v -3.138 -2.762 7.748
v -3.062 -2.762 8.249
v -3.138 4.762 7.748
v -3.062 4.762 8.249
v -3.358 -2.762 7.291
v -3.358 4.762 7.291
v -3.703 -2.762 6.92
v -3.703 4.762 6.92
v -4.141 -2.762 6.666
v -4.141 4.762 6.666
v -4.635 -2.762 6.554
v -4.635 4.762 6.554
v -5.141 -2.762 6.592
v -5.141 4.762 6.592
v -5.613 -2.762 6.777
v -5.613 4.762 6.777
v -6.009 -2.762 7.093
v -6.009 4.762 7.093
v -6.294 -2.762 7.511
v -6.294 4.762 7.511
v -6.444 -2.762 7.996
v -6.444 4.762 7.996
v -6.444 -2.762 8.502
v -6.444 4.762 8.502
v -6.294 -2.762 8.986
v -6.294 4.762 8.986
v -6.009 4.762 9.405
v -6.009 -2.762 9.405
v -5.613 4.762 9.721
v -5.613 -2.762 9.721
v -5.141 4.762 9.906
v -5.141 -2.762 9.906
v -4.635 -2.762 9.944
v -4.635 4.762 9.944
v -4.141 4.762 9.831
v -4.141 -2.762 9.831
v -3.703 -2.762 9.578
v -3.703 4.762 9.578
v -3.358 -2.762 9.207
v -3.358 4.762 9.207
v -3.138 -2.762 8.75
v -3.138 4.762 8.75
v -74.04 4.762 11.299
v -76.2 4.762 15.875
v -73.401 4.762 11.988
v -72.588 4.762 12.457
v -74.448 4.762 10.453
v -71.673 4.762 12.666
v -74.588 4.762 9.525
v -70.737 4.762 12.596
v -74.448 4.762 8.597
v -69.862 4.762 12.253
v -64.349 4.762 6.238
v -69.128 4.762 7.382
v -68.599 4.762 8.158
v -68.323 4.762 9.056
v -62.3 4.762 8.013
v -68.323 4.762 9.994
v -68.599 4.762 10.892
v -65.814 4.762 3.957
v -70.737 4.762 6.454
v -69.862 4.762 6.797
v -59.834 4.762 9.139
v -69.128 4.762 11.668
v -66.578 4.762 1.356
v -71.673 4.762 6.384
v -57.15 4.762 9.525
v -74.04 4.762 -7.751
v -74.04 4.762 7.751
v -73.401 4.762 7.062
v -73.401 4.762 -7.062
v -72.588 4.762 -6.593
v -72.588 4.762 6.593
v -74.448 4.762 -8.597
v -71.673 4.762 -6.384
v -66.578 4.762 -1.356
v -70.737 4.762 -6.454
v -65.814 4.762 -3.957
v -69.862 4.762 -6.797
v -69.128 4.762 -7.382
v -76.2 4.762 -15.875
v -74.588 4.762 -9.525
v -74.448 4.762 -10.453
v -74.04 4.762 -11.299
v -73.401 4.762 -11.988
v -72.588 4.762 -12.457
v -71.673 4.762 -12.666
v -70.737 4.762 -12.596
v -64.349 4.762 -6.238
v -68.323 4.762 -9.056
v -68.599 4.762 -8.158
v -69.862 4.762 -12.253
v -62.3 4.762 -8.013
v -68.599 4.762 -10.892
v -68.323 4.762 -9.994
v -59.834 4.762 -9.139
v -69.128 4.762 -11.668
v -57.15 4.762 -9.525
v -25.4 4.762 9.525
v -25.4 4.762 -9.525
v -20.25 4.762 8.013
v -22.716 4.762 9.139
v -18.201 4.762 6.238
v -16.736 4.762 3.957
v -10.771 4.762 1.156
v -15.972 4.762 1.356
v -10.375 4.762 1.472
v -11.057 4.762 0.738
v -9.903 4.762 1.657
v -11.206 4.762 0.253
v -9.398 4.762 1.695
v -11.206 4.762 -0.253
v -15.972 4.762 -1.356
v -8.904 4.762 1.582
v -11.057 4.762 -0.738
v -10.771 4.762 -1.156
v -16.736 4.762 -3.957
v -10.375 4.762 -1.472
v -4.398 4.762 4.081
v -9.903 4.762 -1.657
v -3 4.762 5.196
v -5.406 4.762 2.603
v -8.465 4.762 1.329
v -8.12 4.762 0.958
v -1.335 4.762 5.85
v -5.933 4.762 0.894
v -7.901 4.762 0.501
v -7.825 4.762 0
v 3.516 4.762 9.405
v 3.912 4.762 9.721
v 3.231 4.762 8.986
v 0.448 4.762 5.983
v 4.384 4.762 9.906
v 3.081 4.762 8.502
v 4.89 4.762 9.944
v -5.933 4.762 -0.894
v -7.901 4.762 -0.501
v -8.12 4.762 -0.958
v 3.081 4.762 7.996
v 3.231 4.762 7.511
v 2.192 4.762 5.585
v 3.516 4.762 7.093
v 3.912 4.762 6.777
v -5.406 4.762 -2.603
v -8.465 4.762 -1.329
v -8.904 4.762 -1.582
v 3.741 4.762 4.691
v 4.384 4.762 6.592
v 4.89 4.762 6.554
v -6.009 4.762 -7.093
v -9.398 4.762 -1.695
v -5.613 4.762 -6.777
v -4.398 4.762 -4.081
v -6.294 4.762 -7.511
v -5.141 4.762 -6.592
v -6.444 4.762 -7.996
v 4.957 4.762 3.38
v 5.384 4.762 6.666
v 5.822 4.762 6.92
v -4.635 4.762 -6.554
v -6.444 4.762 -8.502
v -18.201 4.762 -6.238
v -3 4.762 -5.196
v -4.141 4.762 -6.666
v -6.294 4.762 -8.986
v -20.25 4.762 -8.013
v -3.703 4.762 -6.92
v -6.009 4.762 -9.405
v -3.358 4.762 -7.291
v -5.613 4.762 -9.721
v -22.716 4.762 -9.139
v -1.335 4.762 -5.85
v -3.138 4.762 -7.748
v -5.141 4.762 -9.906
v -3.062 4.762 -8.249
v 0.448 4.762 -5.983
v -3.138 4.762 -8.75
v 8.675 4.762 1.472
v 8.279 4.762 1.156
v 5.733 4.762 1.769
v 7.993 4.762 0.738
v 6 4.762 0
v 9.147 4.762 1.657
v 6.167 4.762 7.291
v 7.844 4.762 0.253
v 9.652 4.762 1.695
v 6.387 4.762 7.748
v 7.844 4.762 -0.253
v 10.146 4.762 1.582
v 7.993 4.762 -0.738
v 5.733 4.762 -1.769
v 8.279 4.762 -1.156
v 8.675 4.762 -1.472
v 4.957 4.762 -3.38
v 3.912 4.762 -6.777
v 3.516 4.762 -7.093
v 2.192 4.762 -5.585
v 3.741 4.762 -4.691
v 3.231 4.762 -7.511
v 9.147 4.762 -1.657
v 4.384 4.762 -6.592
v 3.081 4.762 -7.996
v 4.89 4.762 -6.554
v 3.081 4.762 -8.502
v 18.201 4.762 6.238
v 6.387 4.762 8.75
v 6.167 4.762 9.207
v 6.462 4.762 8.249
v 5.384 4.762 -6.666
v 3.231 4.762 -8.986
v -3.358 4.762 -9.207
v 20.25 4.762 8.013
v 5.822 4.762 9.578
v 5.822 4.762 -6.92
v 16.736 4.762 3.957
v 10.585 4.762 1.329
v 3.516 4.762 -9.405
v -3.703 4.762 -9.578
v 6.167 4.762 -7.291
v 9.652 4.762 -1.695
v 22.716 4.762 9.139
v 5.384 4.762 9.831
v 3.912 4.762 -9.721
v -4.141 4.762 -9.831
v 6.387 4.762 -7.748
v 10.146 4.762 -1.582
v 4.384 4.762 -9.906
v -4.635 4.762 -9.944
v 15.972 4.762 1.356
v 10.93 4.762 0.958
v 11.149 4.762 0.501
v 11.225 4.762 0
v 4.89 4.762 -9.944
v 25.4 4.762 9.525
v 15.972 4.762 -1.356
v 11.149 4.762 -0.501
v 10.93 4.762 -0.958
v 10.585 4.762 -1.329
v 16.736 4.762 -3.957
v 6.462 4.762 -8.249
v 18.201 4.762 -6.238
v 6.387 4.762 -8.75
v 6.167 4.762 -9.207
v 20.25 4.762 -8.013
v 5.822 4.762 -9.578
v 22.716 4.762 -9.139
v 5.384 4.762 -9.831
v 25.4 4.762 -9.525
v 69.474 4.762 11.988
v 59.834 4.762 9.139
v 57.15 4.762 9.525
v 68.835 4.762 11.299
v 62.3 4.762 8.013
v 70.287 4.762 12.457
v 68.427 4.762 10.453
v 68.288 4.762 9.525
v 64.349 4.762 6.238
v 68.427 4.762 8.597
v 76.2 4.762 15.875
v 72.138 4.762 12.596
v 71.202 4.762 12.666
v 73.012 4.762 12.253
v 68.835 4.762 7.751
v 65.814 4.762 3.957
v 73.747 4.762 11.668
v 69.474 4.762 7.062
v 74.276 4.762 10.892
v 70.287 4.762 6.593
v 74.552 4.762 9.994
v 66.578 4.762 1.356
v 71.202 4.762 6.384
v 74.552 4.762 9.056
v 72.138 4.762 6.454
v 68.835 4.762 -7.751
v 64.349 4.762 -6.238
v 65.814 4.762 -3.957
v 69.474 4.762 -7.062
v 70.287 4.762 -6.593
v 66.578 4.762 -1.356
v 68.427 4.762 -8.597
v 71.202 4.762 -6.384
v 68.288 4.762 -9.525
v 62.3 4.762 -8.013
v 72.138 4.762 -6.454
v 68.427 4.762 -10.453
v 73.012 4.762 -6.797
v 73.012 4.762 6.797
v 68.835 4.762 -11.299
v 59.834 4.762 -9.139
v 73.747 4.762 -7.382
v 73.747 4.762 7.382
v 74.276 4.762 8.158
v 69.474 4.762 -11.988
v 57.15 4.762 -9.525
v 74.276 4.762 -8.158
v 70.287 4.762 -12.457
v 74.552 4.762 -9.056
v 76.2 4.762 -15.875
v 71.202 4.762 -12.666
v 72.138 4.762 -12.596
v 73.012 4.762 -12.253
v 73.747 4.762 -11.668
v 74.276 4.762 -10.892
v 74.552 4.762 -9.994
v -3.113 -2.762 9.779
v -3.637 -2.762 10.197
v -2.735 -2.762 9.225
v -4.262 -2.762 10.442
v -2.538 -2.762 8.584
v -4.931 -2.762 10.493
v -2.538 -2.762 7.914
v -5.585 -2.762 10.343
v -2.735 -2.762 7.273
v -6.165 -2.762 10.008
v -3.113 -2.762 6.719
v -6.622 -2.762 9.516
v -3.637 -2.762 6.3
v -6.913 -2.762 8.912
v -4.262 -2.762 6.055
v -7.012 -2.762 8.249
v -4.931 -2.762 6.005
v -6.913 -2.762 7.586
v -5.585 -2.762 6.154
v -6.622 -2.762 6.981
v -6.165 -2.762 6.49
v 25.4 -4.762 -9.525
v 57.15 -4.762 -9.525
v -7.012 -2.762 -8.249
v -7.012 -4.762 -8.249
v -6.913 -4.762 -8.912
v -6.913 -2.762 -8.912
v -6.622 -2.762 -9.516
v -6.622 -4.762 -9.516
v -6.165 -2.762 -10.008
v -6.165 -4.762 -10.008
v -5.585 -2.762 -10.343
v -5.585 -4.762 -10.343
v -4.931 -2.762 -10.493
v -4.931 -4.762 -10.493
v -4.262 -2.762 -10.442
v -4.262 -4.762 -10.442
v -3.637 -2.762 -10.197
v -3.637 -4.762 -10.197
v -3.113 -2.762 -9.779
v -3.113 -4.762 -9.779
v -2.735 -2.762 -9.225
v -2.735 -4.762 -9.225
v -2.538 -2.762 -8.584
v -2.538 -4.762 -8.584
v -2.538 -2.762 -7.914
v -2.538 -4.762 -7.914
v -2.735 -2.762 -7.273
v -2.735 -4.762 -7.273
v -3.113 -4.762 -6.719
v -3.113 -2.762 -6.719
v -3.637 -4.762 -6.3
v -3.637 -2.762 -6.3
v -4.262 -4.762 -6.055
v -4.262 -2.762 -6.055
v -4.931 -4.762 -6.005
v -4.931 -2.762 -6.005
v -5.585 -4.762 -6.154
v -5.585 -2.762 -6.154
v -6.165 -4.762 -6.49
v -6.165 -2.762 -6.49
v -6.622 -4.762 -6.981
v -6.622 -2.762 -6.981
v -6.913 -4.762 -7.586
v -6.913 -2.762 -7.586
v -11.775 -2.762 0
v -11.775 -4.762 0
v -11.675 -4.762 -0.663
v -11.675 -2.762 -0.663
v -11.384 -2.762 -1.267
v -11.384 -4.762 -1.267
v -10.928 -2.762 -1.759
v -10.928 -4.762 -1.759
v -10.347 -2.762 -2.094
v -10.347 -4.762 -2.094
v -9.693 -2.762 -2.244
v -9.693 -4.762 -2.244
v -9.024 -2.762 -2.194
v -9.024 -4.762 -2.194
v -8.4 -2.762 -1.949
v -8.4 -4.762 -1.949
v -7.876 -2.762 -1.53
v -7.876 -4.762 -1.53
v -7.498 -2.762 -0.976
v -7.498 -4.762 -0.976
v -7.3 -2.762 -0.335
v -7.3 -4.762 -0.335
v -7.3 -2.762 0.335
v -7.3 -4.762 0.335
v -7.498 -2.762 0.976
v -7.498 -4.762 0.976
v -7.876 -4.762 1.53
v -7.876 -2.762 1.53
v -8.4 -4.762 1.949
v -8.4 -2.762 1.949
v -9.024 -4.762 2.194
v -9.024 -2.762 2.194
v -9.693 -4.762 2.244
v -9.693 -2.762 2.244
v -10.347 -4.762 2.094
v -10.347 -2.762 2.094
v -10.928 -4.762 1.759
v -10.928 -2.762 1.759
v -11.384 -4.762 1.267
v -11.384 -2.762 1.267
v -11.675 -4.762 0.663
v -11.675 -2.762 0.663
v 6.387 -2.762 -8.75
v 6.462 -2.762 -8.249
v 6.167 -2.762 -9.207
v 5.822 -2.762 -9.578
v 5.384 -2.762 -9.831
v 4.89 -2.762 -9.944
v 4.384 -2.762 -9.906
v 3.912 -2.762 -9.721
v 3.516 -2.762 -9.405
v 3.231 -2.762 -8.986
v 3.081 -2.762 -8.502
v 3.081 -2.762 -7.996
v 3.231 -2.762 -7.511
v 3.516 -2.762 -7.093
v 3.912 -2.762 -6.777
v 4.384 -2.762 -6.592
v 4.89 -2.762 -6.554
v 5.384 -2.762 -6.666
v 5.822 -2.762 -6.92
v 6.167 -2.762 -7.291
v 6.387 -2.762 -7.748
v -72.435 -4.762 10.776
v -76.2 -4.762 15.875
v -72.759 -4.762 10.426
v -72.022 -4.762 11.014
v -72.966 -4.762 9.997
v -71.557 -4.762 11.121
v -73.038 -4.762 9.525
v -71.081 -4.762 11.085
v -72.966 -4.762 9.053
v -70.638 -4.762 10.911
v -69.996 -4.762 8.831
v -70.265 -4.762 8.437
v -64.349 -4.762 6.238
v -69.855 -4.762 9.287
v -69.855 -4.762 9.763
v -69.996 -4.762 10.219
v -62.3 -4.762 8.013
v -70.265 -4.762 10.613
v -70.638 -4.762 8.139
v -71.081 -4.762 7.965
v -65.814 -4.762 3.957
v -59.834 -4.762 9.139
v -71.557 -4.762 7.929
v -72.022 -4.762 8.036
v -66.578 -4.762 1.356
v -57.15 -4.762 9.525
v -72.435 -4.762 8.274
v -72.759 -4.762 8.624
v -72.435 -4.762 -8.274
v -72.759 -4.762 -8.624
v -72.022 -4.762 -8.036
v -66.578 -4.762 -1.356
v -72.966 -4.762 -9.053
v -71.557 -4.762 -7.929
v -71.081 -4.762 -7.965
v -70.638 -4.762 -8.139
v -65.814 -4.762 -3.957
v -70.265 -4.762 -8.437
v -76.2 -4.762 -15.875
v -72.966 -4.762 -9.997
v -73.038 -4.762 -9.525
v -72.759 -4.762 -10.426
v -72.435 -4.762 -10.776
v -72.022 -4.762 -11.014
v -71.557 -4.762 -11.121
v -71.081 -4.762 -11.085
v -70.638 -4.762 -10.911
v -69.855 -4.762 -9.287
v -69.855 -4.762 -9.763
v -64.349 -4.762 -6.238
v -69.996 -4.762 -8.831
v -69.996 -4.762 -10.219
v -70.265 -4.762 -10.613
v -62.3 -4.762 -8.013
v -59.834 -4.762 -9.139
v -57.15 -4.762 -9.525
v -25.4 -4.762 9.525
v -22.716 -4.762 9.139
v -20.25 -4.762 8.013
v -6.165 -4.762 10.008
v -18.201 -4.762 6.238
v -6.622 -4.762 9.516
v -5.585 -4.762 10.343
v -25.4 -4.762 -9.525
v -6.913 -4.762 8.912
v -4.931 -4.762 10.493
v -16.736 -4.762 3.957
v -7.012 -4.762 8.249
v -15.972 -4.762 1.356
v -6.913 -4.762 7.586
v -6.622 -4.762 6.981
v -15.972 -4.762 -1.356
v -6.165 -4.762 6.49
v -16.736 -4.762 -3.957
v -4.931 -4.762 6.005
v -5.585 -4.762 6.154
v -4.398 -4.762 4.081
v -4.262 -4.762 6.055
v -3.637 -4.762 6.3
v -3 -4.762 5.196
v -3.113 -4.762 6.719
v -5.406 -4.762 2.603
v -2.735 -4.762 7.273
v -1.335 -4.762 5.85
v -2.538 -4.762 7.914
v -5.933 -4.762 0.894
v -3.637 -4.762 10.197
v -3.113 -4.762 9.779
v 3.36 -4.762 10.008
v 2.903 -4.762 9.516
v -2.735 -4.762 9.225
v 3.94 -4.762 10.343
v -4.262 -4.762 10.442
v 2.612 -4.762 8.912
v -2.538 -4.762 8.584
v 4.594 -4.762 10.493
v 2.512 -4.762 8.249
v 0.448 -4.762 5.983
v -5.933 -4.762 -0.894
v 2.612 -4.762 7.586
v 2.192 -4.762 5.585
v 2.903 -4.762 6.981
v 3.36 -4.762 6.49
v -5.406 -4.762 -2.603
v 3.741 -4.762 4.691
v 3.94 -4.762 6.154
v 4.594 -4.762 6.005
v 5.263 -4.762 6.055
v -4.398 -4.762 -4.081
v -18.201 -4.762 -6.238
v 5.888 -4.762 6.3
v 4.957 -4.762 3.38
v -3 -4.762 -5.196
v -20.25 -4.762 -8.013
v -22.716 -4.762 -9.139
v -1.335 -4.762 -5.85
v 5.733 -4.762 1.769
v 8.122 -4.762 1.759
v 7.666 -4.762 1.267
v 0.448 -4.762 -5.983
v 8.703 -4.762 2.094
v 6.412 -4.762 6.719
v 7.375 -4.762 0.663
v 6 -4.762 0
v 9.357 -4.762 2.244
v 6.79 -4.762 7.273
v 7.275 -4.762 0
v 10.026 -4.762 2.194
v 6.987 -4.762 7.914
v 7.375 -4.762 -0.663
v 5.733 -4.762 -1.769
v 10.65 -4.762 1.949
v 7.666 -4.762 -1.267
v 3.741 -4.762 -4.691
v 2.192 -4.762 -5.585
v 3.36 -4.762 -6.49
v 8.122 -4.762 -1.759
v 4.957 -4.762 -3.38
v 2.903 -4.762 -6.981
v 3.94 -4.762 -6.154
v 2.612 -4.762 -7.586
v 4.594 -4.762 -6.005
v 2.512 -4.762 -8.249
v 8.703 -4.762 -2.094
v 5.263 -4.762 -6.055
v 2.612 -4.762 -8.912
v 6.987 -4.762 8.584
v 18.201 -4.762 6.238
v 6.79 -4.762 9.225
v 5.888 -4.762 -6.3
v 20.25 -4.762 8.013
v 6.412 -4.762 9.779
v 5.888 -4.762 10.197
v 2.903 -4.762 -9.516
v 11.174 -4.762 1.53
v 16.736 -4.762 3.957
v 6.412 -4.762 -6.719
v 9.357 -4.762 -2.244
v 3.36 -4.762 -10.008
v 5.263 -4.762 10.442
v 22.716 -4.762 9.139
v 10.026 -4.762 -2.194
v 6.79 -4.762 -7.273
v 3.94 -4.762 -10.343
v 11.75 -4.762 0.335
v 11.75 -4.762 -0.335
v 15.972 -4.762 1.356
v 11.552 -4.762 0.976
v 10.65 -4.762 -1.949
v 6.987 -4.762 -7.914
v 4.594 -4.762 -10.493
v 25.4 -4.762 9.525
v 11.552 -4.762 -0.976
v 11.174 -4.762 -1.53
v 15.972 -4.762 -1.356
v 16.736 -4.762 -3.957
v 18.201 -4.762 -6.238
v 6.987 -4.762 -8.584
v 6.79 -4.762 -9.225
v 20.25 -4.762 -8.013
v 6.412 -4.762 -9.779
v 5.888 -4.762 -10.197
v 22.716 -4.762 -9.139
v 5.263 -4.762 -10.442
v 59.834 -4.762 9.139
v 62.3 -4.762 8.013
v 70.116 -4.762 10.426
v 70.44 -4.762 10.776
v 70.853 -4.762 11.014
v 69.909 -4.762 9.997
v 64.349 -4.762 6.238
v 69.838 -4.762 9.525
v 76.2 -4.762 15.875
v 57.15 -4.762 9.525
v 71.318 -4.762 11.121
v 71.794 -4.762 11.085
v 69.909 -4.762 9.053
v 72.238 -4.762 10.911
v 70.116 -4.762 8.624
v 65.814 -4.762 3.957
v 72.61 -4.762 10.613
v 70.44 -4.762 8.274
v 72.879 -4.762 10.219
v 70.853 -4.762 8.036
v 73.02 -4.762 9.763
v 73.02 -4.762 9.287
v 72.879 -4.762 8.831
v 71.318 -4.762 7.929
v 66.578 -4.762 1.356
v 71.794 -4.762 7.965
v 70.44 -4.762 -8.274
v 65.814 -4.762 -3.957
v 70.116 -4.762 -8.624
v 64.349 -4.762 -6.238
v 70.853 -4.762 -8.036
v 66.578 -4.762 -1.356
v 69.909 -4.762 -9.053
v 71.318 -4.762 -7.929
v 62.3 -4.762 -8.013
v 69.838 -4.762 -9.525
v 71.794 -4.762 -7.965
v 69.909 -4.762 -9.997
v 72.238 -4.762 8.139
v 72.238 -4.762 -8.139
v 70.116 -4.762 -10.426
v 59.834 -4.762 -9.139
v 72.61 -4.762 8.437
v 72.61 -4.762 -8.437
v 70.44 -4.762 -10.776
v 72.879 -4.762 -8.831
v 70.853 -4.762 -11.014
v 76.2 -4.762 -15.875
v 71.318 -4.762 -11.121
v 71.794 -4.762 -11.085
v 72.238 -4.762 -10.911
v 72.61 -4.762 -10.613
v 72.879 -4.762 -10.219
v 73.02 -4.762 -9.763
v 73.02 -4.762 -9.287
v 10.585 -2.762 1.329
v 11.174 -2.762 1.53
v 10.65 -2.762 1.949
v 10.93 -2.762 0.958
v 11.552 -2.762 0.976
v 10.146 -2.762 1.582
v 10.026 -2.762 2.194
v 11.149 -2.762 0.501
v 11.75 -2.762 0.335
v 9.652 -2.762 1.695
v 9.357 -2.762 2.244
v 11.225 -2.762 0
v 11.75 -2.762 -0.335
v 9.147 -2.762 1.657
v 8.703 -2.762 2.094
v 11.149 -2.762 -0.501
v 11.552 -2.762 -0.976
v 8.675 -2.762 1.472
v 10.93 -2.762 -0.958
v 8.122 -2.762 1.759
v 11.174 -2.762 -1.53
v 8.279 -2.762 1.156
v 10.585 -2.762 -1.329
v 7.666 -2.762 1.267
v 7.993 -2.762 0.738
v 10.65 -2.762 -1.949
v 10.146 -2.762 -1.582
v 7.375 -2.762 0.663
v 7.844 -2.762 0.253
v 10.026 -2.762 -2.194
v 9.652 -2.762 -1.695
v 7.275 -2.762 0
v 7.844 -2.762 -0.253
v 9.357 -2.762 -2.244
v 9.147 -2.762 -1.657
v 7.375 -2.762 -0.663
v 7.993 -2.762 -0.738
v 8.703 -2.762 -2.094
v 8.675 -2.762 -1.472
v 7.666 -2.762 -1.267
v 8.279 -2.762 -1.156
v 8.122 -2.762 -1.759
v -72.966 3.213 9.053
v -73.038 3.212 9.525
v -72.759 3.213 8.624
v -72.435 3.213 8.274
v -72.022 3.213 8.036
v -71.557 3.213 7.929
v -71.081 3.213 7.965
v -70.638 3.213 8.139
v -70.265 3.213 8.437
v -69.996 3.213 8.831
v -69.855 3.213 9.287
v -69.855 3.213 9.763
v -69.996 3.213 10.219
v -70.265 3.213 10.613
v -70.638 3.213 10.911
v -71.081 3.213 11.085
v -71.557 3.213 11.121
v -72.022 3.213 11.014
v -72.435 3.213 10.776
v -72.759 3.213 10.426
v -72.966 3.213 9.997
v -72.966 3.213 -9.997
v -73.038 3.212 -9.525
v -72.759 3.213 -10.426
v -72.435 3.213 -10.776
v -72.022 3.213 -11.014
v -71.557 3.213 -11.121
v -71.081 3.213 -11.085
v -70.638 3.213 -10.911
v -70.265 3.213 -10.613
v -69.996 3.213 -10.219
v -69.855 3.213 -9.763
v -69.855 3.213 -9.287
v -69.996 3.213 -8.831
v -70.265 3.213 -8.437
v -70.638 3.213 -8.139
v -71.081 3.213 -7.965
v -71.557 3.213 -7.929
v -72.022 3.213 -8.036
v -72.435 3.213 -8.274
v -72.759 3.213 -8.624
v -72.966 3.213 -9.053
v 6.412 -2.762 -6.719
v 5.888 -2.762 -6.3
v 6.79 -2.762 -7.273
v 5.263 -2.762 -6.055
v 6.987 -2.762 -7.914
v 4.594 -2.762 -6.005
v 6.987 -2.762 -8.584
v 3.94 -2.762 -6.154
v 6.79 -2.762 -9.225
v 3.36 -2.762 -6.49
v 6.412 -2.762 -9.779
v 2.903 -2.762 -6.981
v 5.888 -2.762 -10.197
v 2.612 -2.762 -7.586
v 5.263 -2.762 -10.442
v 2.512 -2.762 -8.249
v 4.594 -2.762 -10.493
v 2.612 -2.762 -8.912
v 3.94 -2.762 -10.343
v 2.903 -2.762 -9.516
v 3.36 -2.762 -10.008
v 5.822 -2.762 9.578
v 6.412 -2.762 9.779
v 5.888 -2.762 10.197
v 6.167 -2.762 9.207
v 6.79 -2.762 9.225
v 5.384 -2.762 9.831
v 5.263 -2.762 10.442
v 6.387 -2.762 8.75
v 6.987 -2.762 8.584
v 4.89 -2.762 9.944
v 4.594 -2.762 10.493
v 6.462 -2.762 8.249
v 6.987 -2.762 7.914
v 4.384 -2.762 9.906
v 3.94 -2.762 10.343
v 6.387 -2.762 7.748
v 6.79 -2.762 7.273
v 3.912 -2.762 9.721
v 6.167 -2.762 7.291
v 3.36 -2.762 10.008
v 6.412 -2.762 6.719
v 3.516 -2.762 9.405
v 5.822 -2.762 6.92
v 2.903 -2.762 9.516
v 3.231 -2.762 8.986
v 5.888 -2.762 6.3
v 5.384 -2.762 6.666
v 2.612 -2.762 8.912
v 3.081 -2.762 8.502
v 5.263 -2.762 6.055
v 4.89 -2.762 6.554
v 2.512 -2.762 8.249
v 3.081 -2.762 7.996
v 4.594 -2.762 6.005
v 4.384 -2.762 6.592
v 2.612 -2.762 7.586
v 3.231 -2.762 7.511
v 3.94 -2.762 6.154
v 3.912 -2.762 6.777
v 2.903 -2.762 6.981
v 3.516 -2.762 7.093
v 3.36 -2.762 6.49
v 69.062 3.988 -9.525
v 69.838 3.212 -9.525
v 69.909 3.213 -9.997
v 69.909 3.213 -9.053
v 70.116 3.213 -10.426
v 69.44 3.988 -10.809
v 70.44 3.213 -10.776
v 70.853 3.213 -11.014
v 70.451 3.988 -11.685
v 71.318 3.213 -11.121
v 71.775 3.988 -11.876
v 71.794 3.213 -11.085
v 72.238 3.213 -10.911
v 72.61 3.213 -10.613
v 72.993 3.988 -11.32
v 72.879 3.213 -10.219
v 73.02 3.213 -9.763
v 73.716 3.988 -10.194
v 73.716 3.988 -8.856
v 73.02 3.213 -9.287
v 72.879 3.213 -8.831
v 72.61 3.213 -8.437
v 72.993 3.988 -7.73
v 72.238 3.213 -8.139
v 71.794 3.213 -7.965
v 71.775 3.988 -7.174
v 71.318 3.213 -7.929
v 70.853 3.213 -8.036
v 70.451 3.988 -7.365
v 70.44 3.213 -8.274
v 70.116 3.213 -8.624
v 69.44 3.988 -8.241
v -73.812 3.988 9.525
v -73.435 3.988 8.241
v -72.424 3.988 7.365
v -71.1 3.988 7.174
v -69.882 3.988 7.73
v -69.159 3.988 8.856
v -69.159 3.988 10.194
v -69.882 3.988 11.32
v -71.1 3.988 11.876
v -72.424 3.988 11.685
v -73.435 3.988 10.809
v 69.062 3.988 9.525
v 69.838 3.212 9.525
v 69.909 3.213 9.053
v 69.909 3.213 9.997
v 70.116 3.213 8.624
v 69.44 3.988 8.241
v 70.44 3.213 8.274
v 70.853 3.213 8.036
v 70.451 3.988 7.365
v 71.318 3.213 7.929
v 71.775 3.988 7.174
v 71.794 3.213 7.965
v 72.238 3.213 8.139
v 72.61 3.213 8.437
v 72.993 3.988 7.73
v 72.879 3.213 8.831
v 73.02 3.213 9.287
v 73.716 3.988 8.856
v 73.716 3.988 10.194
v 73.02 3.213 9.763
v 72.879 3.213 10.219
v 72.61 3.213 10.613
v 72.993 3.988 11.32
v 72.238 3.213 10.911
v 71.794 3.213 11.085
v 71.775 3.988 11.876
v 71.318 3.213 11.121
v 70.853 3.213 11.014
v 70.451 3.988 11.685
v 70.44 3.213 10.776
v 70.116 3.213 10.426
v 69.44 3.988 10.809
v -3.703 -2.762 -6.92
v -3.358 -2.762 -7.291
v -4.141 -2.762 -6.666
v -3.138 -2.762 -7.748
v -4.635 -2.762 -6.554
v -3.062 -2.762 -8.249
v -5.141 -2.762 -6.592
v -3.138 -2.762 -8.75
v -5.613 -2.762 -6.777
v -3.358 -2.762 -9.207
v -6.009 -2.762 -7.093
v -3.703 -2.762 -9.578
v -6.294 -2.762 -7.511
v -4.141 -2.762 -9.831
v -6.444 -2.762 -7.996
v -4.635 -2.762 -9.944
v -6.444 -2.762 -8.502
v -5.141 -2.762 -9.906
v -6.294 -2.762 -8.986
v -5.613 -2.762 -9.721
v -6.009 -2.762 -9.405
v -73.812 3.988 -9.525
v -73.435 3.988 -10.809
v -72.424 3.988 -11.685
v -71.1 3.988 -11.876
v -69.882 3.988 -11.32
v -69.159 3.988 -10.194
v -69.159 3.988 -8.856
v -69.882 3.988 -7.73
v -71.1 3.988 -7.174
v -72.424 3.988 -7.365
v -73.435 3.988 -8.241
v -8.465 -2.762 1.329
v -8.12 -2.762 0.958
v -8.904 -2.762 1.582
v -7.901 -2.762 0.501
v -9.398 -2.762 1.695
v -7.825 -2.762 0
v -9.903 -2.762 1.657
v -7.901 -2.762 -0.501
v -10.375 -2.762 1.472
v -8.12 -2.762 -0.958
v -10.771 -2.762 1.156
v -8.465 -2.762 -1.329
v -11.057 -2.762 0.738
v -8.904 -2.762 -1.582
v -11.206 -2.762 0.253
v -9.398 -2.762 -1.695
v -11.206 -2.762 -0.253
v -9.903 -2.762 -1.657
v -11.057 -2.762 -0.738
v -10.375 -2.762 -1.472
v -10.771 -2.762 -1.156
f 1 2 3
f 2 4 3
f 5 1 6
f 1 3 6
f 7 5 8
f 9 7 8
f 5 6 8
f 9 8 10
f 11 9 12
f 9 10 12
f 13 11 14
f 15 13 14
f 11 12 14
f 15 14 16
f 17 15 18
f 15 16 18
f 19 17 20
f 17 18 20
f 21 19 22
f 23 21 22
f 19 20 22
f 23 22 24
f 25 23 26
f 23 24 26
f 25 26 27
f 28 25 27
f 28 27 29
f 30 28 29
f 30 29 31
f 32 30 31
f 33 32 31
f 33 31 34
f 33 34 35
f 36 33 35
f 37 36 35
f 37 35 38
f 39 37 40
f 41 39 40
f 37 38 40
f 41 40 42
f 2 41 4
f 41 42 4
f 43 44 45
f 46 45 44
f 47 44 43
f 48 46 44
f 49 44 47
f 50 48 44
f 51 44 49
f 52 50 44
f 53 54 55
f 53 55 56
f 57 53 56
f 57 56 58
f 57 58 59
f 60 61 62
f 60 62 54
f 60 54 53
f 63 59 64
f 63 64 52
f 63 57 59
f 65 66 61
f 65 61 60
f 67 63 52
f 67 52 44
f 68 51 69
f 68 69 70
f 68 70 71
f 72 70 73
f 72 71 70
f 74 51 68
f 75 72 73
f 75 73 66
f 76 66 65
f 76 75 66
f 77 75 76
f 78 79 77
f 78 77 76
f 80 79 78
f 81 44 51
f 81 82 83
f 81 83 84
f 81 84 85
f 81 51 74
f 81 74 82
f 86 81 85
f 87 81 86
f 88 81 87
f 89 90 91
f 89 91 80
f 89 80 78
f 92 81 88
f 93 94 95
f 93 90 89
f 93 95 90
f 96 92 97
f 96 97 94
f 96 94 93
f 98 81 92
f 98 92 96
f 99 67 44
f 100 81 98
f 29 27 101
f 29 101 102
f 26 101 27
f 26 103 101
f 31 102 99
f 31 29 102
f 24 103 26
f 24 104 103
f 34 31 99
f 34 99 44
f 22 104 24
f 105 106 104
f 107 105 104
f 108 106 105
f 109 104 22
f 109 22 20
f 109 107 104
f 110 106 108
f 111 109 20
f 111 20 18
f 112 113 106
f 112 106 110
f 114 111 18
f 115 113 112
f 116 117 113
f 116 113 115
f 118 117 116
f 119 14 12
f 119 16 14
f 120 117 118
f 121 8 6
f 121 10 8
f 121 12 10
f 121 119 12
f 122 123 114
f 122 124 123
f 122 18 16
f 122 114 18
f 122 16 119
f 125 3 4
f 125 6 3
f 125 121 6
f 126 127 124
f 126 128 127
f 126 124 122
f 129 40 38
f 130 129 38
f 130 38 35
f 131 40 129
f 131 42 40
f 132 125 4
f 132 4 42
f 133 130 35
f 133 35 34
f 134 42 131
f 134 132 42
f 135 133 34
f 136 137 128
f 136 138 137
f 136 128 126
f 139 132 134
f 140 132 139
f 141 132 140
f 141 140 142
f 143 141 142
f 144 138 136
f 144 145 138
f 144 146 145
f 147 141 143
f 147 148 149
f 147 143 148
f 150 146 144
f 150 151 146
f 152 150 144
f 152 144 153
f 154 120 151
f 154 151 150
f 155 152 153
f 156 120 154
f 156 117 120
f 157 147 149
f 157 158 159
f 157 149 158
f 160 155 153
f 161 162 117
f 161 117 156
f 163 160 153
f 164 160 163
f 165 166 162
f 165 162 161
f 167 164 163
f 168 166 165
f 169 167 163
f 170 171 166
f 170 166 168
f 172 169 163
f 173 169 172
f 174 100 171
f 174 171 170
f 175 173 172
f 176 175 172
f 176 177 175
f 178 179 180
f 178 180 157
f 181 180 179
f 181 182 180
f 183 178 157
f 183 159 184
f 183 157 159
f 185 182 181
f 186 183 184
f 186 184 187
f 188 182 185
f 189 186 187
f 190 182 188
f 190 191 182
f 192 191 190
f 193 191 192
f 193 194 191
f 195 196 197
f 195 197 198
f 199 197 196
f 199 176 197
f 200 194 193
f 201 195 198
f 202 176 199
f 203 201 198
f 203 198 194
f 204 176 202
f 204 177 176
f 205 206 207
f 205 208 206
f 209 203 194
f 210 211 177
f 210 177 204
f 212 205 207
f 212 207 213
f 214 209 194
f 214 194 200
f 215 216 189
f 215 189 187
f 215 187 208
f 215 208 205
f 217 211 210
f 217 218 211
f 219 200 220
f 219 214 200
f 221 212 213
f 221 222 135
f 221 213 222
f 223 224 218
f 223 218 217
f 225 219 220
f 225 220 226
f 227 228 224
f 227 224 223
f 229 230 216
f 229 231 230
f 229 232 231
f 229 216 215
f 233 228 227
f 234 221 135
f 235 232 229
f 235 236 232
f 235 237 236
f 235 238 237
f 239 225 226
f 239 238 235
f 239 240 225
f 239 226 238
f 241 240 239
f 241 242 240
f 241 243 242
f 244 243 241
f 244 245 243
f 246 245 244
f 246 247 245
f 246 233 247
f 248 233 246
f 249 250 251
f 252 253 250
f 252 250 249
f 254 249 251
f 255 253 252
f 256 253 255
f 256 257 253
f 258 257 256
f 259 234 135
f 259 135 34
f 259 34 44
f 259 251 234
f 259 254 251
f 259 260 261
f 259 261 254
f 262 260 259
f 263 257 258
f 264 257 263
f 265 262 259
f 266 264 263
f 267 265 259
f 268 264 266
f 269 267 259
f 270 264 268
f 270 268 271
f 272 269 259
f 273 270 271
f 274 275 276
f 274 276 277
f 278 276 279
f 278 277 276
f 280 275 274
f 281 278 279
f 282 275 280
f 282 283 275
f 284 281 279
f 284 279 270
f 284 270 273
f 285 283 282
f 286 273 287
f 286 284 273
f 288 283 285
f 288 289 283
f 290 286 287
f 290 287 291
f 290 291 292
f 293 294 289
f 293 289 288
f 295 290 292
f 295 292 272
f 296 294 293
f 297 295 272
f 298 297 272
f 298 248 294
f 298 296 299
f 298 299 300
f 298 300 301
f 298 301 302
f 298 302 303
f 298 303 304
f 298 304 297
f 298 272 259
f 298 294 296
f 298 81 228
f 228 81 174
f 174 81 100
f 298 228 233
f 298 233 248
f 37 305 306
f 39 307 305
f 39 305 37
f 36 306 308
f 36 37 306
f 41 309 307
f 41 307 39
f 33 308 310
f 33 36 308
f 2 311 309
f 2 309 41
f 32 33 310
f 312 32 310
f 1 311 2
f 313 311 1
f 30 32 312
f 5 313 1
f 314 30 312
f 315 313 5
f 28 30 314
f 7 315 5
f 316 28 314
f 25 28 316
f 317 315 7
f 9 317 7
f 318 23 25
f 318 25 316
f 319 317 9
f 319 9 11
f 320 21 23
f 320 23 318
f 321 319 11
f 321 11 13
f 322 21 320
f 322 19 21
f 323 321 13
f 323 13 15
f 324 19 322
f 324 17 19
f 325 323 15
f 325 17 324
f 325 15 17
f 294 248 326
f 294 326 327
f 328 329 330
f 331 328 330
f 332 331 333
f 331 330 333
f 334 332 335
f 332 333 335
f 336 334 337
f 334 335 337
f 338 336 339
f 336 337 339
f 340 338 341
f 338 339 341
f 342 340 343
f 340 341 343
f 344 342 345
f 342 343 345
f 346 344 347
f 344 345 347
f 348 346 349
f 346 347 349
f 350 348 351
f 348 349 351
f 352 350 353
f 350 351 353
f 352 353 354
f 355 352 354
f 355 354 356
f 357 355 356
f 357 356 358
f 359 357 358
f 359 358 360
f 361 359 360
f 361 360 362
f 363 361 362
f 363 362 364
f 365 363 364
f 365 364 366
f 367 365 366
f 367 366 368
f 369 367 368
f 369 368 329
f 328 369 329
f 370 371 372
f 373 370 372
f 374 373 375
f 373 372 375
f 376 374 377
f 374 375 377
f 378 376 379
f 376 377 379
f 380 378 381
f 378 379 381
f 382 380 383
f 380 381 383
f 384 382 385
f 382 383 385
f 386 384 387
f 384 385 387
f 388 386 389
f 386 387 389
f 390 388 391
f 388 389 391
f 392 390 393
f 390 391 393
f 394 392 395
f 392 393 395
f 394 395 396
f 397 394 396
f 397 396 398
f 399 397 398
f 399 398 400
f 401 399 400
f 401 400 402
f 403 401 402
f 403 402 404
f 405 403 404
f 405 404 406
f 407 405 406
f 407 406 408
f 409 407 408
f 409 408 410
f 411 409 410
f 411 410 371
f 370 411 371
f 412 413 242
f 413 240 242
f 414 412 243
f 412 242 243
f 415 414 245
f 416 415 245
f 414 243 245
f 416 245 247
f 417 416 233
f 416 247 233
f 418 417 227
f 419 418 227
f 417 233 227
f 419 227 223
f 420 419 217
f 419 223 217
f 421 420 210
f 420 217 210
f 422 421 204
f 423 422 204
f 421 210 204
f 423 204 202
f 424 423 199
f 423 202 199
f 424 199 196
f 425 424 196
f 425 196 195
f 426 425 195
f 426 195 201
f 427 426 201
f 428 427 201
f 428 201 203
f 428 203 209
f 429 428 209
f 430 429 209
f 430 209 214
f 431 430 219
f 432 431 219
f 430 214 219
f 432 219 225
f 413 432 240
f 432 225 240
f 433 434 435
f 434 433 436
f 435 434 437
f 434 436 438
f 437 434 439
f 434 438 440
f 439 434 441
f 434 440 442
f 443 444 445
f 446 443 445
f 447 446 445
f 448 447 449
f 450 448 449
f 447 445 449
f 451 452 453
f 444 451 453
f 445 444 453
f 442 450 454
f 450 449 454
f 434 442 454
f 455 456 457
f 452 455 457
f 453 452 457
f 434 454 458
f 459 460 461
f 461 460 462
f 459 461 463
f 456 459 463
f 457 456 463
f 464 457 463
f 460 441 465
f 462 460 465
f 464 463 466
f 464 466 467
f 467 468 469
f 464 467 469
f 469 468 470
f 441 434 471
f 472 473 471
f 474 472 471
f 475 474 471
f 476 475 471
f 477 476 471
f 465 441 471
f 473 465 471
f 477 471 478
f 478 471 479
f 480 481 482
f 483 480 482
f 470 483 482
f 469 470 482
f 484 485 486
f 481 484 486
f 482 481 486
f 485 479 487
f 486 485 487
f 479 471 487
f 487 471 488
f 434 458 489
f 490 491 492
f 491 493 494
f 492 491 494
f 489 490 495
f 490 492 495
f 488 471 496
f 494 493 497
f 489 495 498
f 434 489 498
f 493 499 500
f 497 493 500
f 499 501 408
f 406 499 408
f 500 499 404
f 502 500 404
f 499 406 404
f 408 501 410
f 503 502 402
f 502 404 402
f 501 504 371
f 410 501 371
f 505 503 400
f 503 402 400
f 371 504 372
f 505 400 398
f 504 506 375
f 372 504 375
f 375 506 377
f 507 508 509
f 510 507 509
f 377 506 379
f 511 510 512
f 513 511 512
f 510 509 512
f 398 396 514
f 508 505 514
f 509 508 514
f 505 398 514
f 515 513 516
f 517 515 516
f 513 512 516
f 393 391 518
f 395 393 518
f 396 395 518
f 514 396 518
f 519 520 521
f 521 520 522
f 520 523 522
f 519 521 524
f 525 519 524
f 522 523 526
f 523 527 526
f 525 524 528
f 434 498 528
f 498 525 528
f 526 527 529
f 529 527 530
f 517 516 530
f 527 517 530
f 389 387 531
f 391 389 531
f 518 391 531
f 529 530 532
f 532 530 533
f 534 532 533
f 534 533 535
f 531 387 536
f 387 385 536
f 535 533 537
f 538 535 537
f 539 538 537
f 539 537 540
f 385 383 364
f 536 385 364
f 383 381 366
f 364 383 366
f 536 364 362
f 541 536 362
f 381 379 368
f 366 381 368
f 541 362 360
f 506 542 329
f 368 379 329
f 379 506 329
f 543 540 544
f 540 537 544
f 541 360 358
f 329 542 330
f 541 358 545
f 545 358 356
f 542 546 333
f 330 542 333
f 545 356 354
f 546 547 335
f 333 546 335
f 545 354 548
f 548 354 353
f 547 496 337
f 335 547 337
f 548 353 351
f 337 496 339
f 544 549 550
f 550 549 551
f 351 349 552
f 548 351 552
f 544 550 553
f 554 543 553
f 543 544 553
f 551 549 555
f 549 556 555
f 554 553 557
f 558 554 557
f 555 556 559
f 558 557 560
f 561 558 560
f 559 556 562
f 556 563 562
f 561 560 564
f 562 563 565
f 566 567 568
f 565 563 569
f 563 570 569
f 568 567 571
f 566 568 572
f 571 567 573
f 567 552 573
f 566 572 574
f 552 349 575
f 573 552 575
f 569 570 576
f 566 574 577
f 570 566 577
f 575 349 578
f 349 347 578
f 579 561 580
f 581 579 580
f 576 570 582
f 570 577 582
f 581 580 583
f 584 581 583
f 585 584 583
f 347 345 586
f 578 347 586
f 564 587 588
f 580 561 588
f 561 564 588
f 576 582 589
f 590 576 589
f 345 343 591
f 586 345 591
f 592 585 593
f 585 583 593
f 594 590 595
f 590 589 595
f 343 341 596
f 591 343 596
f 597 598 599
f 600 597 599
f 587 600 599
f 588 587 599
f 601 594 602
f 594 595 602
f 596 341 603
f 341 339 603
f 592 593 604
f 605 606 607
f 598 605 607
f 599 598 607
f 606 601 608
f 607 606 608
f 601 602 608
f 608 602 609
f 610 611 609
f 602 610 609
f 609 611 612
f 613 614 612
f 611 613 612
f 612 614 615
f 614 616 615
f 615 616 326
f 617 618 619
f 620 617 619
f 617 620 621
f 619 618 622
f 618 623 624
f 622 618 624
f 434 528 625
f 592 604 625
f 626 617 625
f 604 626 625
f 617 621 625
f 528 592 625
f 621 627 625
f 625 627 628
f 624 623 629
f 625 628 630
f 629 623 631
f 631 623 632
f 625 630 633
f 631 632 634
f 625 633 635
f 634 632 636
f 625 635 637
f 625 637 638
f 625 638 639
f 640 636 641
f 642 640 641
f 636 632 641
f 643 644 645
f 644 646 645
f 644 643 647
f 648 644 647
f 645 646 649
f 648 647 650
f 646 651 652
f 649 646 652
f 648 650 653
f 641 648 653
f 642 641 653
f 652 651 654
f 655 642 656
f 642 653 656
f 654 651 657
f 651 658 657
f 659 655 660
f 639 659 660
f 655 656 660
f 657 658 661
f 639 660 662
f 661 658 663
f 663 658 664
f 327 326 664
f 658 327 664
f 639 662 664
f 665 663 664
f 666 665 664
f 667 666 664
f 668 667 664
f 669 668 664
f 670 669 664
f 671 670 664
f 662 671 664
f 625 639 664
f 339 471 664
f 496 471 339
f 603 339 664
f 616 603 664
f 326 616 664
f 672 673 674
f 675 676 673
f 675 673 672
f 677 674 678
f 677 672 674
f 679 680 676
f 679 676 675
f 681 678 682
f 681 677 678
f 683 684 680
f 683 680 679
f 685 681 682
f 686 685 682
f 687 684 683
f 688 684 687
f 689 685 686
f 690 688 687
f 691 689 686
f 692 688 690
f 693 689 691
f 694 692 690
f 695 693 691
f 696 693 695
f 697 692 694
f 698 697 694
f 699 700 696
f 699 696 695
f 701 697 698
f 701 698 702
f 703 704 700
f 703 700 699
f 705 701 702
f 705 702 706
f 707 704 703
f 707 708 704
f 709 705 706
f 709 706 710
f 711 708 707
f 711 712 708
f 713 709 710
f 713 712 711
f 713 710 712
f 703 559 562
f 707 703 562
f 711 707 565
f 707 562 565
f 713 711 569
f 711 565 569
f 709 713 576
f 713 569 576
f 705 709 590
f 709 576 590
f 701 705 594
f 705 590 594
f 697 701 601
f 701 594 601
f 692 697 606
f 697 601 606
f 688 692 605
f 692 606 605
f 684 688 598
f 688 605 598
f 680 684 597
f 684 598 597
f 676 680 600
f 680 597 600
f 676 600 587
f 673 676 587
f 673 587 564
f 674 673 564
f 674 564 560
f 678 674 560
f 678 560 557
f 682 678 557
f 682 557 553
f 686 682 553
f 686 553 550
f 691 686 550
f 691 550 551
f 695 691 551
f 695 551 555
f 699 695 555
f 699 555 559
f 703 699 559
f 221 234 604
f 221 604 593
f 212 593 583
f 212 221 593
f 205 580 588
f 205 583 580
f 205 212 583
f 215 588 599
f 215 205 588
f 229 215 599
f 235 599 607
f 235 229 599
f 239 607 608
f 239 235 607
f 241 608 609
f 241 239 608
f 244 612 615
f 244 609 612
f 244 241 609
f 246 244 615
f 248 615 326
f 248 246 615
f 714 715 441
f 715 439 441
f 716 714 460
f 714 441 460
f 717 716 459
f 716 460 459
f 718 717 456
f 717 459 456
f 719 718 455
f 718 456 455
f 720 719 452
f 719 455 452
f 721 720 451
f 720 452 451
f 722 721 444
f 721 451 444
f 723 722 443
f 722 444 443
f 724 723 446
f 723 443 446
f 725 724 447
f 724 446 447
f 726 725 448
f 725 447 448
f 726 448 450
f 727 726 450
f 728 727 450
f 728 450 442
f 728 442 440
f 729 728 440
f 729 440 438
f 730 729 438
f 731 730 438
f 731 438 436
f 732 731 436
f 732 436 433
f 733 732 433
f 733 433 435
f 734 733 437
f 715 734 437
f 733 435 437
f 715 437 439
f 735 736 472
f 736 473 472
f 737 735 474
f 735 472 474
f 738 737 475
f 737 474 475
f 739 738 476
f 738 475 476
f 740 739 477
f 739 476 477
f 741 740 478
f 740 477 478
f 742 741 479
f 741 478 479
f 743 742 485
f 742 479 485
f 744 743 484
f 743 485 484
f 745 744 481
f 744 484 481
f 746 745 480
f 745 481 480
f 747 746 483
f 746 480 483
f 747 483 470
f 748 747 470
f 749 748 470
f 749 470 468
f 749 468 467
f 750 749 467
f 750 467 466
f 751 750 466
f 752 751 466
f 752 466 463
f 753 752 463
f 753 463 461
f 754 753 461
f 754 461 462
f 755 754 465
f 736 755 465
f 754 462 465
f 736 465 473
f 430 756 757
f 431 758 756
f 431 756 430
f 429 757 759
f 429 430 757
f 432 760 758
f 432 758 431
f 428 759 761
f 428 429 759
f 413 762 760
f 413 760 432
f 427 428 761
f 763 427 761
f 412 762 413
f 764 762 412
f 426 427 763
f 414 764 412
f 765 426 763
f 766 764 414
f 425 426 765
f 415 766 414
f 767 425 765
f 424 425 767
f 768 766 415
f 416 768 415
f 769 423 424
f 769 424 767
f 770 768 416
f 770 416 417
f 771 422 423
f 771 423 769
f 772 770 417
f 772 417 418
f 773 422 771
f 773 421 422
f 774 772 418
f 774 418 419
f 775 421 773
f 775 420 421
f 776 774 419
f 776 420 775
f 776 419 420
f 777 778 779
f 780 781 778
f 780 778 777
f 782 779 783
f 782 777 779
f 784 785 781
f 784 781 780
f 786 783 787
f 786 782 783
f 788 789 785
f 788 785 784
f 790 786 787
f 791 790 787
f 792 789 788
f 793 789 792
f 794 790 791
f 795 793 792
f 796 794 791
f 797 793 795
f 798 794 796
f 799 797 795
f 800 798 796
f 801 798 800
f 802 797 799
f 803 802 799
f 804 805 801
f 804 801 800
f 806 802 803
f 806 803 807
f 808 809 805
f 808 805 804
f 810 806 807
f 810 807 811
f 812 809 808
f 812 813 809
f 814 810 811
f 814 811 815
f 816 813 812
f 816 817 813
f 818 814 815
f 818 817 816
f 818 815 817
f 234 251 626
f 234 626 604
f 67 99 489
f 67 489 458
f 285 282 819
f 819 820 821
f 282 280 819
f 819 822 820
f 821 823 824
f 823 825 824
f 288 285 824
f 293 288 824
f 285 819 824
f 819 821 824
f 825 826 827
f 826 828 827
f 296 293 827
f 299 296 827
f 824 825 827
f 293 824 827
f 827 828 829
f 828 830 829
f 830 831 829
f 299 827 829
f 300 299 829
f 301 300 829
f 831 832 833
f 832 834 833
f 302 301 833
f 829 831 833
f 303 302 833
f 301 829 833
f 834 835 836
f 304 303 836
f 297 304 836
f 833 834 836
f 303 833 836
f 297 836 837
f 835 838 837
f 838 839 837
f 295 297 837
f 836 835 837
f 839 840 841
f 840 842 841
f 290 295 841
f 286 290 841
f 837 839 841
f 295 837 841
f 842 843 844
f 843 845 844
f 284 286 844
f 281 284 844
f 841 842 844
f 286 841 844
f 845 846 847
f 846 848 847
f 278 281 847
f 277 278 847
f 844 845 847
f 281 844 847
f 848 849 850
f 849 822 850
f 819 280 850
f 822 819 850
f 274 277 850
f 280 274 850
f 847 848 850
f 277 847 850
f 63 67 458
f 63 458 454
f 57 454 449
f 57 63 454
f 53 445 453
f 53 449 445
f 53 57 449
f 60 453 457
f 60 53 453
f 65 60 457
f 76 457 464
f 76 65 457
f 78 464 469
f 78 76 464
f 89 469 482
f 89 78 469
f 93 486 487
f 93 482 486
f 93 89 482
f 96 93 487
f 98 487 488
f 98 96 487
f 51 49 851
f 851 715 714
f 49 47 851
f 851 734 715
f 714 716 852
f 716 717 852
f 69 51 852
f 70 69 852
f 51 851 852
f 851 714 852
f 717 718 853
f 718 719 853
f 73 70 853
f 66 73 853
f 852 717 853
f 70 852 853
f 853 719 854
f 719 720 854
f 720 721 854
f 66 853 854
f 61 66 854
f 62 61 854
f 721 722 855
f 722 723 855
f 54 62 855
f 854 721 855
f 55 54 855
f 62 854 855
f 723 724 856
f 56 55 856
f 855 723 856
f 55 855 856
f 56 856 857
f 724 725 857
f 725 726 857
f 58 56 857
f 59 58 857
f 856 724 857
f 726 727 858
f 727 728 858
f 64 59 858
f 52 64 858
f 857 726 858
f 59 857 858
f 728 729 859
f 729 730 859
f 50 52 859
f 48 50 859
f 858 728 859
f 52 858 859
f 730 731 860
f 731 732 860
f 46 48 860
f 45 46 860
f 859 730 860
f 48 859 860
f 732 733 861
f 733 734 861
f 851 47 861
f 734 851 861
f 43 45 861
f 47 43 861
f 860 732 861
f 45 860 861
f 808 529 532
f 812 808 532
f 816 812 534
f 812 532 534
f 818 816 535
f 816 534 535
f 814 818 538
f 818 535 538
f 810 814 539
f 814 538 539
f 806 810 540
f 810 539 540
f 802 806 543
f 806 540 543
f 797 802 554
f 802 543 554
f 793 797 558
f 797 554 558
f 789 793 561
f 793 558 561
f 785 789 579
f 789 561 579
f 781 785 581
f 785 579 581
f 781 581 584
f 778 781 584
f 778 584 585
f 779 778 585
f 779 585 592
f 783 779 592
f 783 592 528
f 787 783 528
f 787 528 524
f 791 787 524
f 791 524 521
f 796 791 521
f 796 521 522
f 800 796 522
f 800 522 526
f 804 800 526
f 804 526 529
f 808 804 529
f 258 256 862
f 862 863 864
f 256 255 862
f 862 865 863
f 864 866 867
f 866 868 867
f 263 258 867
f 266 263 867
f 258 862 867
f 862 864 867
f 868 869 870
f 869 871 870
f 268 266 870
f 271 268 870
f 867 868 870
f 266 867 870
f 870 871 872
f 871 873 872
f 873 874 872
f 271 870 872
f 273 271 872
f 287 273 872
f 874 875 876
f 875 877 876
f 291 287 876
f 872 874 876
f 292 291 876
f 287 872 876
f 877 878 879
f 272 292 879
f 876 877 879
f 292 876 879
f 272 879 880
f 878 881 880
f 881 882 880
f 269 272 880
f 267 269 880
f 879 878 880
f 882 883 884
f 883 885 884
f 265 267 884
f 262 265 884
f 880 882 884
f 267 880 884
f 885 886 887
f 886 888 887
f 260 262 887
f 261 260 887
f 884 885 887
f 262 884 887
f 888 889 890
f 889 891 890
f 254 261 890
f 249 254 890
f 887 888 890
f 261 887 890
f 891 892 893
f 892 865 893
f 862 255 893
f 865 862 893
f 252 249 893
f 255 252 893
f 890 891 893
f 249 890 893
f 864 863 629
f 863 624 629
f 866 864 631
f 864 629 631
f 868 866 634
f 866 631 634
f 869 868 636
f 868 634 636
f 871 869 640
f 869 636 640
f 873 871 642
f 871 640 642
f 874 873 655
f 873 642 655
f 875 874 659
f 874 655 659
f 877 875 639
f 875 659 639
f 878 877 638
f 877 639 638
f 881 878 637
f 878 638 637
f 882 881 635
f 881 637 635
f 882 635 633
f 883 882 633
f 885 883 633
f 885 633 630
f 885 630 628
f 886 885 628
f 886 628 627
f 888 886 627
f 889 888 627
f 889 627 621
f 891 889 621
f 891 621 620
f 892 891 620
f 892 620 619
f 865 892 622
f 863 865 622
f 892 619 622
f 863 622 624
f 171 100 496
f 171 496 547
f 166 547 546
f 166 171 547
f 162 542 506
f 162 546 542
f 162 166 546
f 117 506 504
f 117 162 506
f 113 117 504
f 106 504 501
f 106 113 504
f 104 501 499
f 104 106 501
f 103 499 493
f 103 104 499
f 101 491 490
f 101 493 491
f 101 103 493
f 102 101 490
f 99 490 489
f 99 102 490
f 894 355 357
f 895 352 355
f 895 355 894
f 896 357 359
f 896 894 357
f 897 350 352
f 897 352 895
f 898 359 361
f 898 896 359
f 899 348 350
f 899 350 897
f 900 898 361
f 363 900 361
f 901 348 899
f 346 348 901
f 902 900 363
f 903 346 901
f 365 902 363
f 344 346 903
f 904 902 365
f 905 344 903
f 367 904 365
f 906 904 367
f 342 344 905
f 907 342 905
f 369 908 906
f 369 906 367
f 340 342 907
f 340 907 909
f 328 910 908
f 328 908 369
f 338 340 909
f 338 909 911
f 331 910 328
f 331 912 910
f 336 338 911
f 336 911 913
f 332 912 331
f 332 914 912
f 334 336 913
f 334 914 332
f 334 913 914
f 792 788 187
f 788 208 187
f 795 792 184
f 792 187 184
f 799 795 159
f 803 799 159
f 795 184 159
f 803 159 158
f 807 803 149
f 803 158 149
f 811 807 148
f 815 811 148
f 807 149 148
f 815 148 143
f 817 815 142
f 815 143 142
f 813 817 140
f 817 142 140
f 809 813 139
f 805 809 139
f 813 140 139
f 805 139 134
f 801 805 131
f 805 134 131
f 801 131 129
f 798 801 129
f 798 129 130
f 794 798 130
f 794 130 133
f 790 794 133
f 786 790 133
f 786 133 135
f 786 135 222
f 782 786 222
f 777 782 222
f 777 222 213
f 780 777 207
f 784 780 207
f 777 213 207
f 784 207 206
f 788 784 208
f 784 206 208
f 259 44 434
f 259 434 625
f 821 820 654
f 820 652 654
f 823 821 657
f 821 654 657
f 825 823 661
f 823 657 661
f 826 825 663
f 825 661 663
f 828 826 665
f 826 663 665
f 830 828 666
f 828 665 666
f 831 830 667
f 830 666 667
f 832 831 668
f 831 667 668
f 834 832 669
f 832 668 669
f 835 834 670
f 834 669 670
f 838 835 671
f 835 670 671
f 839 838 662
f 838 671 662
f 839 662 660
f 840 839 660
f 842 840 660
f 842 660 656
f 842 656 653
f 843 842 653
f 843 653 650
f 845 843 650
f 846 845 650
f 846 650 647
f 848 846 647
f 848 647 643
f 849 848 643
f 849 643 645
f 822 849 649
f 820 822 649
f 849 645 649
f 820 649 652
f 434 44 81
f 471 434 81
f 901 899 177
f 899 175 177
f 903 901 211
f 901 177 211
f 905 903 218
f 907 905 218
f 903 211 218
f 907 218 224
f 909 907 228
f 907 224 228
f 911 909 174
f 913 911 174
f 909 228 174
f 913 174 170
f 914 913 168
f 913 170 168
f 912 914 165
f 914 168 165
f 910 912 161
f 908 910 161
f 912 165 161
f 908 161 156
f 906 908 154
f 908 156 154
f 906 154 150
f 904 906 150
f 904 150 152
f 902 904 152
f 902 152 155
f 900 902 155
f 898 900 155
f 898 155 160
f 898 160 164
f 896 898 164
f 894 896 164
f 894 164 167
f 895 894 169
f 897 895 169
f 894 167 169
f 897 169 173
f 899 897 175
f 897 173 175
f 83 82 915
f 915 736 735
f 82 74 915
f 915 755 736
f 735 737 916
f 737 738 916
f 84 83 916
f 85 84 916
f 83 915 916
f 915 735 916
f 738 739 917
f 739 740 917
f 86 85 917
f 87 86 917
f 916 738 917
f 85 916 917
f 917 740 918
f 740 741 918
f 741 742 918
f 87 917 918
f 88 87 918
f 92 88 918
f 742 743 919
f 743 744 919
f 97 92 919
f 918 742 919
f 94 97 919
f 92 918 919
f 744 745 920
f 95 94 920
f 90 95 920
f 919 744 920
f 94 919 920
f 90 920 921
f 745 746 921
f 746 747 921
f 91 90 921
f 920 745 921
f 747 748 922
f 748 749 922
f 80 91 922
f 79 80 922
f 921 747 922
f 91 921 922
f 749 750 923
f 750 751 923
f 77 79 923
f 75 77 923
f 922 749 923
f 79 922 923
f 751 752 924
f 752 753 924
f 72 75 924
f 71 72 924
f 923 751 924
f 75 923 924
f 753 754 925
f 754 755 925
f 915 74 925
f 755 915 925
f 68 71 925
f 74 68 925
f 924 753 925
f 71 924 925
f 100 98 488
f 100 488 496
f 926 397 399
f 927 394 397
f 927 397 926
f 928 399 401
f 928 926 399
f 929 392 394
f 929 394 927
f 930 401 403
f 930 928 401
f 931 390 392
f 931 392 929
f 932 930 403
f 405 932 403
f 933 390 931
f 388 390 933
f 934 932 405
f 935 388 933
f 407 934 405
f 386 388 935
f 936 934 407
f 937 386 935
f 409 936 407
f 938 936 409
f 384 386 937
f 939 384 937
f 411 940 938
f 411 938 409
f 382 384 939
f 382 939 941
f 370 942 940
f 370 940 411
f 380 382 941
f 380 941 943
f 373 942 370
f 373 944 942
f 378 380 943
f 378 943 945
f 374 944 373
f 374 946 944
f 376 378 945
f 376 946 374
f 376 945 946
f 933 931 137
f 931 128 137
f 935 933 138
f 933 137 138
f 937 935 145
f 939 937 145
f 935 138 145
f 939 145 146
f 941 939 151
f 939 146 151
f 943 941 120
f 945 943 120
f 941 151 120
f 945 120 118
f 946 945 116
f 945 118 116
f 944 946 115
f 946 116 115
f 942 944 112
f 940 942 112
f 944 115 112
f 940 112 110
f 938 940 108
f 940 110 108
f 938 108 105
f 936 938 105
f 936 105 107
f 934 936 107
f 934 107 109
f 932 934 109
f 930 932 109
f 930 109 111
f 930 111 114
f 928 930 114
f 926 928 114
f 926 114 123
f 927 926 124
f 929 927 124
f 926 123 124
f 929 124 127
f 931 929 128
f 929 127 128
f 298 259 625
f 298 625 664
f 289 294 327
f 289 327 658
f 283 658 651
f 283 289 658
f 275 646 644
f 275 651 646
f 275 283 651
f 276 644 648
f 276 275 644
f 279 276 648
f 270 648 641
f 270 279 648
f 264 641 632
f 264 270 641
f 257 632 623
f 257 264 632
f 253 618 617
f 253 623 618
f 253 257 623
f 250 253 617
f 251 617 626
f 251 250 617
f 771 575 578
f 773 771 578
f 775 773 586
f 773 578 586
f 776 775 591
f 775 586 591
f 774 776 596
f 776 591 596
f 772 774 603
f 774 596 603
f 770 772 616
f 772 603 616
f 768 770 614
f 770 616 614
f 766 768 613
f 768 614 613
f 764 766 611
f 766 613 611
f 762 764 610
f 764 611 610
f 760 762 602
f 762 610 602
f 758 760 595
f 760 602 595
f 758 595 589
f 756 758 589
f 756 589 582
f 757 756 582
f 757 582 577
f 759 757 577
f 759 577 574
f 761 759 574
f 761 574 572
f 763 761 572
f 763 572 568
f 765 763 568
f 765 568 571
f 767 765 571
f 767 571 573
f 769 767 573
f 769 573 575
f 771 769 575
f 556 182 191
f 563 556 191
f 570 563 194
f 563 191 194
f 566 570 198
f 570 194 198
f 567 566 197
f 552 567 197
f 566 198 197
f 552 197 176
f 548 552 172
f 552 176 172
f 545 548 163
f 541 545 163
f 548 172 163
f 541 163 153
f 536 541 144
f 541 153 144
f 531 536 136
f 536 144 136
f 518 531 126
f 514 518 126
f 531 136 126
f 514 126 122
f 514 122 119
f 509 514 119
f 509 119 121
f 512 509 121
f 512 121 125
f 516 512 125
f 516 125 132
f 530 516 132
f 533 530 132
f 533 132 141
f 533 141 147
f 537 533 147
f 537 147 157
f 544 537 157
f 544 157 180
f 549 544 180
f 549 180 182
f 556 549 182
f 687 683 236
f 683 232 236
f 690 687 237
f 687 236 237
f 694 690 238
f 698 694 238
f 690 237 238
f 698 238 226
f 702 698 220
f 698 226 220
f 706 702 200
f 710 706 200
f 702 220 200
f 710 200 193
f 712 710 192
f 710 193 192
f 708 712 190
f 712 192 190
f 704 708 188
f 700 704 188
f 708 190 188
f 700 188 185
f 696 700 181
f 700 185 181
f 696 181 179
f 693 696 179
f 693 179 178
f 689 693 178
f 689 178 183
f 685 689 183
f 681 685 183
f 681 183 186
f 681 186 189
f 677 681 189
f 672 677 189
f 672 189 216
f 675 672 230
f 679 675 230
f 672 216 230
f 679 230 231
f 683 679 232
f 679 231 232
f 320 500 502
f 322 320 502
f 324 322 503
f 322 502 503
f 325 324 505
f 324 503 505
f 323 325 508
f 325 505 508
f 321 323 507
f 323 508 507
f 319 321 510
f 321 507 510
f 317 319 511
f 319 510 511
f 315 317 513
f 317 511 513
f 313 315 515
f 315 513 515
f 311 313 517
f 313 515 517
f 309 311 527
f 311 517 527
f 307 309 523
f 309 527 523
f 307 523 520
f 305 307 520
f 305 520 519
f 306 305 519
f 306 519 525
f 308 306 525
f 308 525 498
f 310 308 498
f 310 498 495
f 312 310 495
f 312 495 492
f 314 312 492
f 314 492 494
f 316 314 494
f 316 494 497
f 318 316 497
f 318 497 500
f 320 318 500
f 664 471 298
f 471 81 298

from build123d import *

# Parameters (mm, degrees)
SKETCH1_W                                       = 152.4
SKETCH1_H                                       = 31.75
BOSS_EXTRUDE1_DEPTH                             = 4.7625
CSK_FOR_M3_FLAT_HEAD_MACHINE_SCREW1_D           = 3.2
CSK_FOR_M3_FLAT_HEAD_MACHINE_SCREW1_CSINK_D     = 6.3
CSK_FOR_M3_FLAT_HEAD_MACHINE_SCREW1_CSINK_ANGLE = 90
F_12_0MM_DOWEL_HOLE1_D                          = 12
CBORE_FOR_M3_SHCS1_D                            = 3.4
CBORE_FOR_M3_SHCS1_CBORE_D                      = 4.5
CBORE_FOR_M3_SHCS1_CBORE_DEPTH                  = 2
CUT_EXTRUDE1_DEPTH                              = 79.416715374


with BuildPart() as part:
    # Sketch1 → Boss-Extrude1 (new, symmetric)
    with BuildSketch(Plane(origin=(0, 0, 0), x_dir=(1, 0, 0), z_dir=(0, 1, 0))):
        Rectangle(SKETCH1_W, SKETCH1_H)
    extrude(amount=BOSS_EXTRUDE1_DEPTH, both=True)

    # CSK for M3 Flat Head Machine Screw1 (through all)
    with Locations(Plane(origin=(0, 4.7625, 0), x_dir=(1, 0, 0), z_dir=(0, 1, 0))):
        with Locations((-71.4375, -9.525), (71.4375, -9.525), (71.4375, 9.525), (-71.4375, 9.525)):
            CounterSinkHole(CSK_FOR_M3_FLAT_HEAD_MACHINE_SCREW1_D / 2, CSK_FOR_M3_FLAT_HEAD_MACHINE_SCREW1_CSINK_D / 2, counter_sink_angle=CSK_FOR_M3_FLAT_HEAD_MACHINE_SCREW1_CSINK_ANGLE)

    # Ø12.0mm Dowel Hole1 (through all)
    with Locations(Plane(origin=(0, -4.7625, 0), x_dir=(-1, 0, 0), z_dir=(0, -1, 0))):
        with Locations((0, 0)):
            Hole(F_12_0MM_DOWEL_HOLE1_D / 2)

    # CBORE for M3 SHCS1 (through all)
    with Locations(Plane(origin=(0, -4.7625, 0), x_dir=(-1, 0, 0), z_dir=(0, -1, 0))):
        with Locations((4.7625, -8.248891971), (9.525, 0), (4.7625, 8.248891971), (-4.7625, 8.248891971), (-9.525, 0), (-4.7625, -8.248891971)):
            CounterBoreHole(CBORE_FOR_M3_SHCS1_D / 2, CBORE_FOR_M3_SHCS1_CBORE_D / 2, CBORE_FOR_M3_SHCS1_CBORE_DEPTH)

    # Sketch15 → Cut-Extrude1 (cut, through all)
    with BuildSketch(Plane(origin=(0, 4.7625, 0), x_dir=(1, 0, 0), z_dir=(0, 1, 0))):
        with BuildLine():
            Line((-57.15, 9.525), (-25.4, 9.525))
            ThreePointArc((-25.4, 9.525), (-15.875, 0), (-25.4, -9.525))
            Line((-25.4, -9.525), (-57.15, -9.525))
            ThreePointArc((-57.15, -9.525), (-66.675, 0), (-57.15, 9.525))
        make_face()
        with BuildLine():
            Line((25.4, 9.525), (57.15, 9.525))
            ThreePointArc((57.15, 9.525), (66.675, 0), (57.15, -9.525))
            Line((57.15, -9.525), (25.4, -9.525))
            ThreePointArc((25.4, -9.525), (15.875, 0), (25.4, 9.525))
        make_face()
    extrude(amount=-CUT_EXTRUDE1_DEPTH, mode=Mode.SUBTRACT)


solid = part.part
